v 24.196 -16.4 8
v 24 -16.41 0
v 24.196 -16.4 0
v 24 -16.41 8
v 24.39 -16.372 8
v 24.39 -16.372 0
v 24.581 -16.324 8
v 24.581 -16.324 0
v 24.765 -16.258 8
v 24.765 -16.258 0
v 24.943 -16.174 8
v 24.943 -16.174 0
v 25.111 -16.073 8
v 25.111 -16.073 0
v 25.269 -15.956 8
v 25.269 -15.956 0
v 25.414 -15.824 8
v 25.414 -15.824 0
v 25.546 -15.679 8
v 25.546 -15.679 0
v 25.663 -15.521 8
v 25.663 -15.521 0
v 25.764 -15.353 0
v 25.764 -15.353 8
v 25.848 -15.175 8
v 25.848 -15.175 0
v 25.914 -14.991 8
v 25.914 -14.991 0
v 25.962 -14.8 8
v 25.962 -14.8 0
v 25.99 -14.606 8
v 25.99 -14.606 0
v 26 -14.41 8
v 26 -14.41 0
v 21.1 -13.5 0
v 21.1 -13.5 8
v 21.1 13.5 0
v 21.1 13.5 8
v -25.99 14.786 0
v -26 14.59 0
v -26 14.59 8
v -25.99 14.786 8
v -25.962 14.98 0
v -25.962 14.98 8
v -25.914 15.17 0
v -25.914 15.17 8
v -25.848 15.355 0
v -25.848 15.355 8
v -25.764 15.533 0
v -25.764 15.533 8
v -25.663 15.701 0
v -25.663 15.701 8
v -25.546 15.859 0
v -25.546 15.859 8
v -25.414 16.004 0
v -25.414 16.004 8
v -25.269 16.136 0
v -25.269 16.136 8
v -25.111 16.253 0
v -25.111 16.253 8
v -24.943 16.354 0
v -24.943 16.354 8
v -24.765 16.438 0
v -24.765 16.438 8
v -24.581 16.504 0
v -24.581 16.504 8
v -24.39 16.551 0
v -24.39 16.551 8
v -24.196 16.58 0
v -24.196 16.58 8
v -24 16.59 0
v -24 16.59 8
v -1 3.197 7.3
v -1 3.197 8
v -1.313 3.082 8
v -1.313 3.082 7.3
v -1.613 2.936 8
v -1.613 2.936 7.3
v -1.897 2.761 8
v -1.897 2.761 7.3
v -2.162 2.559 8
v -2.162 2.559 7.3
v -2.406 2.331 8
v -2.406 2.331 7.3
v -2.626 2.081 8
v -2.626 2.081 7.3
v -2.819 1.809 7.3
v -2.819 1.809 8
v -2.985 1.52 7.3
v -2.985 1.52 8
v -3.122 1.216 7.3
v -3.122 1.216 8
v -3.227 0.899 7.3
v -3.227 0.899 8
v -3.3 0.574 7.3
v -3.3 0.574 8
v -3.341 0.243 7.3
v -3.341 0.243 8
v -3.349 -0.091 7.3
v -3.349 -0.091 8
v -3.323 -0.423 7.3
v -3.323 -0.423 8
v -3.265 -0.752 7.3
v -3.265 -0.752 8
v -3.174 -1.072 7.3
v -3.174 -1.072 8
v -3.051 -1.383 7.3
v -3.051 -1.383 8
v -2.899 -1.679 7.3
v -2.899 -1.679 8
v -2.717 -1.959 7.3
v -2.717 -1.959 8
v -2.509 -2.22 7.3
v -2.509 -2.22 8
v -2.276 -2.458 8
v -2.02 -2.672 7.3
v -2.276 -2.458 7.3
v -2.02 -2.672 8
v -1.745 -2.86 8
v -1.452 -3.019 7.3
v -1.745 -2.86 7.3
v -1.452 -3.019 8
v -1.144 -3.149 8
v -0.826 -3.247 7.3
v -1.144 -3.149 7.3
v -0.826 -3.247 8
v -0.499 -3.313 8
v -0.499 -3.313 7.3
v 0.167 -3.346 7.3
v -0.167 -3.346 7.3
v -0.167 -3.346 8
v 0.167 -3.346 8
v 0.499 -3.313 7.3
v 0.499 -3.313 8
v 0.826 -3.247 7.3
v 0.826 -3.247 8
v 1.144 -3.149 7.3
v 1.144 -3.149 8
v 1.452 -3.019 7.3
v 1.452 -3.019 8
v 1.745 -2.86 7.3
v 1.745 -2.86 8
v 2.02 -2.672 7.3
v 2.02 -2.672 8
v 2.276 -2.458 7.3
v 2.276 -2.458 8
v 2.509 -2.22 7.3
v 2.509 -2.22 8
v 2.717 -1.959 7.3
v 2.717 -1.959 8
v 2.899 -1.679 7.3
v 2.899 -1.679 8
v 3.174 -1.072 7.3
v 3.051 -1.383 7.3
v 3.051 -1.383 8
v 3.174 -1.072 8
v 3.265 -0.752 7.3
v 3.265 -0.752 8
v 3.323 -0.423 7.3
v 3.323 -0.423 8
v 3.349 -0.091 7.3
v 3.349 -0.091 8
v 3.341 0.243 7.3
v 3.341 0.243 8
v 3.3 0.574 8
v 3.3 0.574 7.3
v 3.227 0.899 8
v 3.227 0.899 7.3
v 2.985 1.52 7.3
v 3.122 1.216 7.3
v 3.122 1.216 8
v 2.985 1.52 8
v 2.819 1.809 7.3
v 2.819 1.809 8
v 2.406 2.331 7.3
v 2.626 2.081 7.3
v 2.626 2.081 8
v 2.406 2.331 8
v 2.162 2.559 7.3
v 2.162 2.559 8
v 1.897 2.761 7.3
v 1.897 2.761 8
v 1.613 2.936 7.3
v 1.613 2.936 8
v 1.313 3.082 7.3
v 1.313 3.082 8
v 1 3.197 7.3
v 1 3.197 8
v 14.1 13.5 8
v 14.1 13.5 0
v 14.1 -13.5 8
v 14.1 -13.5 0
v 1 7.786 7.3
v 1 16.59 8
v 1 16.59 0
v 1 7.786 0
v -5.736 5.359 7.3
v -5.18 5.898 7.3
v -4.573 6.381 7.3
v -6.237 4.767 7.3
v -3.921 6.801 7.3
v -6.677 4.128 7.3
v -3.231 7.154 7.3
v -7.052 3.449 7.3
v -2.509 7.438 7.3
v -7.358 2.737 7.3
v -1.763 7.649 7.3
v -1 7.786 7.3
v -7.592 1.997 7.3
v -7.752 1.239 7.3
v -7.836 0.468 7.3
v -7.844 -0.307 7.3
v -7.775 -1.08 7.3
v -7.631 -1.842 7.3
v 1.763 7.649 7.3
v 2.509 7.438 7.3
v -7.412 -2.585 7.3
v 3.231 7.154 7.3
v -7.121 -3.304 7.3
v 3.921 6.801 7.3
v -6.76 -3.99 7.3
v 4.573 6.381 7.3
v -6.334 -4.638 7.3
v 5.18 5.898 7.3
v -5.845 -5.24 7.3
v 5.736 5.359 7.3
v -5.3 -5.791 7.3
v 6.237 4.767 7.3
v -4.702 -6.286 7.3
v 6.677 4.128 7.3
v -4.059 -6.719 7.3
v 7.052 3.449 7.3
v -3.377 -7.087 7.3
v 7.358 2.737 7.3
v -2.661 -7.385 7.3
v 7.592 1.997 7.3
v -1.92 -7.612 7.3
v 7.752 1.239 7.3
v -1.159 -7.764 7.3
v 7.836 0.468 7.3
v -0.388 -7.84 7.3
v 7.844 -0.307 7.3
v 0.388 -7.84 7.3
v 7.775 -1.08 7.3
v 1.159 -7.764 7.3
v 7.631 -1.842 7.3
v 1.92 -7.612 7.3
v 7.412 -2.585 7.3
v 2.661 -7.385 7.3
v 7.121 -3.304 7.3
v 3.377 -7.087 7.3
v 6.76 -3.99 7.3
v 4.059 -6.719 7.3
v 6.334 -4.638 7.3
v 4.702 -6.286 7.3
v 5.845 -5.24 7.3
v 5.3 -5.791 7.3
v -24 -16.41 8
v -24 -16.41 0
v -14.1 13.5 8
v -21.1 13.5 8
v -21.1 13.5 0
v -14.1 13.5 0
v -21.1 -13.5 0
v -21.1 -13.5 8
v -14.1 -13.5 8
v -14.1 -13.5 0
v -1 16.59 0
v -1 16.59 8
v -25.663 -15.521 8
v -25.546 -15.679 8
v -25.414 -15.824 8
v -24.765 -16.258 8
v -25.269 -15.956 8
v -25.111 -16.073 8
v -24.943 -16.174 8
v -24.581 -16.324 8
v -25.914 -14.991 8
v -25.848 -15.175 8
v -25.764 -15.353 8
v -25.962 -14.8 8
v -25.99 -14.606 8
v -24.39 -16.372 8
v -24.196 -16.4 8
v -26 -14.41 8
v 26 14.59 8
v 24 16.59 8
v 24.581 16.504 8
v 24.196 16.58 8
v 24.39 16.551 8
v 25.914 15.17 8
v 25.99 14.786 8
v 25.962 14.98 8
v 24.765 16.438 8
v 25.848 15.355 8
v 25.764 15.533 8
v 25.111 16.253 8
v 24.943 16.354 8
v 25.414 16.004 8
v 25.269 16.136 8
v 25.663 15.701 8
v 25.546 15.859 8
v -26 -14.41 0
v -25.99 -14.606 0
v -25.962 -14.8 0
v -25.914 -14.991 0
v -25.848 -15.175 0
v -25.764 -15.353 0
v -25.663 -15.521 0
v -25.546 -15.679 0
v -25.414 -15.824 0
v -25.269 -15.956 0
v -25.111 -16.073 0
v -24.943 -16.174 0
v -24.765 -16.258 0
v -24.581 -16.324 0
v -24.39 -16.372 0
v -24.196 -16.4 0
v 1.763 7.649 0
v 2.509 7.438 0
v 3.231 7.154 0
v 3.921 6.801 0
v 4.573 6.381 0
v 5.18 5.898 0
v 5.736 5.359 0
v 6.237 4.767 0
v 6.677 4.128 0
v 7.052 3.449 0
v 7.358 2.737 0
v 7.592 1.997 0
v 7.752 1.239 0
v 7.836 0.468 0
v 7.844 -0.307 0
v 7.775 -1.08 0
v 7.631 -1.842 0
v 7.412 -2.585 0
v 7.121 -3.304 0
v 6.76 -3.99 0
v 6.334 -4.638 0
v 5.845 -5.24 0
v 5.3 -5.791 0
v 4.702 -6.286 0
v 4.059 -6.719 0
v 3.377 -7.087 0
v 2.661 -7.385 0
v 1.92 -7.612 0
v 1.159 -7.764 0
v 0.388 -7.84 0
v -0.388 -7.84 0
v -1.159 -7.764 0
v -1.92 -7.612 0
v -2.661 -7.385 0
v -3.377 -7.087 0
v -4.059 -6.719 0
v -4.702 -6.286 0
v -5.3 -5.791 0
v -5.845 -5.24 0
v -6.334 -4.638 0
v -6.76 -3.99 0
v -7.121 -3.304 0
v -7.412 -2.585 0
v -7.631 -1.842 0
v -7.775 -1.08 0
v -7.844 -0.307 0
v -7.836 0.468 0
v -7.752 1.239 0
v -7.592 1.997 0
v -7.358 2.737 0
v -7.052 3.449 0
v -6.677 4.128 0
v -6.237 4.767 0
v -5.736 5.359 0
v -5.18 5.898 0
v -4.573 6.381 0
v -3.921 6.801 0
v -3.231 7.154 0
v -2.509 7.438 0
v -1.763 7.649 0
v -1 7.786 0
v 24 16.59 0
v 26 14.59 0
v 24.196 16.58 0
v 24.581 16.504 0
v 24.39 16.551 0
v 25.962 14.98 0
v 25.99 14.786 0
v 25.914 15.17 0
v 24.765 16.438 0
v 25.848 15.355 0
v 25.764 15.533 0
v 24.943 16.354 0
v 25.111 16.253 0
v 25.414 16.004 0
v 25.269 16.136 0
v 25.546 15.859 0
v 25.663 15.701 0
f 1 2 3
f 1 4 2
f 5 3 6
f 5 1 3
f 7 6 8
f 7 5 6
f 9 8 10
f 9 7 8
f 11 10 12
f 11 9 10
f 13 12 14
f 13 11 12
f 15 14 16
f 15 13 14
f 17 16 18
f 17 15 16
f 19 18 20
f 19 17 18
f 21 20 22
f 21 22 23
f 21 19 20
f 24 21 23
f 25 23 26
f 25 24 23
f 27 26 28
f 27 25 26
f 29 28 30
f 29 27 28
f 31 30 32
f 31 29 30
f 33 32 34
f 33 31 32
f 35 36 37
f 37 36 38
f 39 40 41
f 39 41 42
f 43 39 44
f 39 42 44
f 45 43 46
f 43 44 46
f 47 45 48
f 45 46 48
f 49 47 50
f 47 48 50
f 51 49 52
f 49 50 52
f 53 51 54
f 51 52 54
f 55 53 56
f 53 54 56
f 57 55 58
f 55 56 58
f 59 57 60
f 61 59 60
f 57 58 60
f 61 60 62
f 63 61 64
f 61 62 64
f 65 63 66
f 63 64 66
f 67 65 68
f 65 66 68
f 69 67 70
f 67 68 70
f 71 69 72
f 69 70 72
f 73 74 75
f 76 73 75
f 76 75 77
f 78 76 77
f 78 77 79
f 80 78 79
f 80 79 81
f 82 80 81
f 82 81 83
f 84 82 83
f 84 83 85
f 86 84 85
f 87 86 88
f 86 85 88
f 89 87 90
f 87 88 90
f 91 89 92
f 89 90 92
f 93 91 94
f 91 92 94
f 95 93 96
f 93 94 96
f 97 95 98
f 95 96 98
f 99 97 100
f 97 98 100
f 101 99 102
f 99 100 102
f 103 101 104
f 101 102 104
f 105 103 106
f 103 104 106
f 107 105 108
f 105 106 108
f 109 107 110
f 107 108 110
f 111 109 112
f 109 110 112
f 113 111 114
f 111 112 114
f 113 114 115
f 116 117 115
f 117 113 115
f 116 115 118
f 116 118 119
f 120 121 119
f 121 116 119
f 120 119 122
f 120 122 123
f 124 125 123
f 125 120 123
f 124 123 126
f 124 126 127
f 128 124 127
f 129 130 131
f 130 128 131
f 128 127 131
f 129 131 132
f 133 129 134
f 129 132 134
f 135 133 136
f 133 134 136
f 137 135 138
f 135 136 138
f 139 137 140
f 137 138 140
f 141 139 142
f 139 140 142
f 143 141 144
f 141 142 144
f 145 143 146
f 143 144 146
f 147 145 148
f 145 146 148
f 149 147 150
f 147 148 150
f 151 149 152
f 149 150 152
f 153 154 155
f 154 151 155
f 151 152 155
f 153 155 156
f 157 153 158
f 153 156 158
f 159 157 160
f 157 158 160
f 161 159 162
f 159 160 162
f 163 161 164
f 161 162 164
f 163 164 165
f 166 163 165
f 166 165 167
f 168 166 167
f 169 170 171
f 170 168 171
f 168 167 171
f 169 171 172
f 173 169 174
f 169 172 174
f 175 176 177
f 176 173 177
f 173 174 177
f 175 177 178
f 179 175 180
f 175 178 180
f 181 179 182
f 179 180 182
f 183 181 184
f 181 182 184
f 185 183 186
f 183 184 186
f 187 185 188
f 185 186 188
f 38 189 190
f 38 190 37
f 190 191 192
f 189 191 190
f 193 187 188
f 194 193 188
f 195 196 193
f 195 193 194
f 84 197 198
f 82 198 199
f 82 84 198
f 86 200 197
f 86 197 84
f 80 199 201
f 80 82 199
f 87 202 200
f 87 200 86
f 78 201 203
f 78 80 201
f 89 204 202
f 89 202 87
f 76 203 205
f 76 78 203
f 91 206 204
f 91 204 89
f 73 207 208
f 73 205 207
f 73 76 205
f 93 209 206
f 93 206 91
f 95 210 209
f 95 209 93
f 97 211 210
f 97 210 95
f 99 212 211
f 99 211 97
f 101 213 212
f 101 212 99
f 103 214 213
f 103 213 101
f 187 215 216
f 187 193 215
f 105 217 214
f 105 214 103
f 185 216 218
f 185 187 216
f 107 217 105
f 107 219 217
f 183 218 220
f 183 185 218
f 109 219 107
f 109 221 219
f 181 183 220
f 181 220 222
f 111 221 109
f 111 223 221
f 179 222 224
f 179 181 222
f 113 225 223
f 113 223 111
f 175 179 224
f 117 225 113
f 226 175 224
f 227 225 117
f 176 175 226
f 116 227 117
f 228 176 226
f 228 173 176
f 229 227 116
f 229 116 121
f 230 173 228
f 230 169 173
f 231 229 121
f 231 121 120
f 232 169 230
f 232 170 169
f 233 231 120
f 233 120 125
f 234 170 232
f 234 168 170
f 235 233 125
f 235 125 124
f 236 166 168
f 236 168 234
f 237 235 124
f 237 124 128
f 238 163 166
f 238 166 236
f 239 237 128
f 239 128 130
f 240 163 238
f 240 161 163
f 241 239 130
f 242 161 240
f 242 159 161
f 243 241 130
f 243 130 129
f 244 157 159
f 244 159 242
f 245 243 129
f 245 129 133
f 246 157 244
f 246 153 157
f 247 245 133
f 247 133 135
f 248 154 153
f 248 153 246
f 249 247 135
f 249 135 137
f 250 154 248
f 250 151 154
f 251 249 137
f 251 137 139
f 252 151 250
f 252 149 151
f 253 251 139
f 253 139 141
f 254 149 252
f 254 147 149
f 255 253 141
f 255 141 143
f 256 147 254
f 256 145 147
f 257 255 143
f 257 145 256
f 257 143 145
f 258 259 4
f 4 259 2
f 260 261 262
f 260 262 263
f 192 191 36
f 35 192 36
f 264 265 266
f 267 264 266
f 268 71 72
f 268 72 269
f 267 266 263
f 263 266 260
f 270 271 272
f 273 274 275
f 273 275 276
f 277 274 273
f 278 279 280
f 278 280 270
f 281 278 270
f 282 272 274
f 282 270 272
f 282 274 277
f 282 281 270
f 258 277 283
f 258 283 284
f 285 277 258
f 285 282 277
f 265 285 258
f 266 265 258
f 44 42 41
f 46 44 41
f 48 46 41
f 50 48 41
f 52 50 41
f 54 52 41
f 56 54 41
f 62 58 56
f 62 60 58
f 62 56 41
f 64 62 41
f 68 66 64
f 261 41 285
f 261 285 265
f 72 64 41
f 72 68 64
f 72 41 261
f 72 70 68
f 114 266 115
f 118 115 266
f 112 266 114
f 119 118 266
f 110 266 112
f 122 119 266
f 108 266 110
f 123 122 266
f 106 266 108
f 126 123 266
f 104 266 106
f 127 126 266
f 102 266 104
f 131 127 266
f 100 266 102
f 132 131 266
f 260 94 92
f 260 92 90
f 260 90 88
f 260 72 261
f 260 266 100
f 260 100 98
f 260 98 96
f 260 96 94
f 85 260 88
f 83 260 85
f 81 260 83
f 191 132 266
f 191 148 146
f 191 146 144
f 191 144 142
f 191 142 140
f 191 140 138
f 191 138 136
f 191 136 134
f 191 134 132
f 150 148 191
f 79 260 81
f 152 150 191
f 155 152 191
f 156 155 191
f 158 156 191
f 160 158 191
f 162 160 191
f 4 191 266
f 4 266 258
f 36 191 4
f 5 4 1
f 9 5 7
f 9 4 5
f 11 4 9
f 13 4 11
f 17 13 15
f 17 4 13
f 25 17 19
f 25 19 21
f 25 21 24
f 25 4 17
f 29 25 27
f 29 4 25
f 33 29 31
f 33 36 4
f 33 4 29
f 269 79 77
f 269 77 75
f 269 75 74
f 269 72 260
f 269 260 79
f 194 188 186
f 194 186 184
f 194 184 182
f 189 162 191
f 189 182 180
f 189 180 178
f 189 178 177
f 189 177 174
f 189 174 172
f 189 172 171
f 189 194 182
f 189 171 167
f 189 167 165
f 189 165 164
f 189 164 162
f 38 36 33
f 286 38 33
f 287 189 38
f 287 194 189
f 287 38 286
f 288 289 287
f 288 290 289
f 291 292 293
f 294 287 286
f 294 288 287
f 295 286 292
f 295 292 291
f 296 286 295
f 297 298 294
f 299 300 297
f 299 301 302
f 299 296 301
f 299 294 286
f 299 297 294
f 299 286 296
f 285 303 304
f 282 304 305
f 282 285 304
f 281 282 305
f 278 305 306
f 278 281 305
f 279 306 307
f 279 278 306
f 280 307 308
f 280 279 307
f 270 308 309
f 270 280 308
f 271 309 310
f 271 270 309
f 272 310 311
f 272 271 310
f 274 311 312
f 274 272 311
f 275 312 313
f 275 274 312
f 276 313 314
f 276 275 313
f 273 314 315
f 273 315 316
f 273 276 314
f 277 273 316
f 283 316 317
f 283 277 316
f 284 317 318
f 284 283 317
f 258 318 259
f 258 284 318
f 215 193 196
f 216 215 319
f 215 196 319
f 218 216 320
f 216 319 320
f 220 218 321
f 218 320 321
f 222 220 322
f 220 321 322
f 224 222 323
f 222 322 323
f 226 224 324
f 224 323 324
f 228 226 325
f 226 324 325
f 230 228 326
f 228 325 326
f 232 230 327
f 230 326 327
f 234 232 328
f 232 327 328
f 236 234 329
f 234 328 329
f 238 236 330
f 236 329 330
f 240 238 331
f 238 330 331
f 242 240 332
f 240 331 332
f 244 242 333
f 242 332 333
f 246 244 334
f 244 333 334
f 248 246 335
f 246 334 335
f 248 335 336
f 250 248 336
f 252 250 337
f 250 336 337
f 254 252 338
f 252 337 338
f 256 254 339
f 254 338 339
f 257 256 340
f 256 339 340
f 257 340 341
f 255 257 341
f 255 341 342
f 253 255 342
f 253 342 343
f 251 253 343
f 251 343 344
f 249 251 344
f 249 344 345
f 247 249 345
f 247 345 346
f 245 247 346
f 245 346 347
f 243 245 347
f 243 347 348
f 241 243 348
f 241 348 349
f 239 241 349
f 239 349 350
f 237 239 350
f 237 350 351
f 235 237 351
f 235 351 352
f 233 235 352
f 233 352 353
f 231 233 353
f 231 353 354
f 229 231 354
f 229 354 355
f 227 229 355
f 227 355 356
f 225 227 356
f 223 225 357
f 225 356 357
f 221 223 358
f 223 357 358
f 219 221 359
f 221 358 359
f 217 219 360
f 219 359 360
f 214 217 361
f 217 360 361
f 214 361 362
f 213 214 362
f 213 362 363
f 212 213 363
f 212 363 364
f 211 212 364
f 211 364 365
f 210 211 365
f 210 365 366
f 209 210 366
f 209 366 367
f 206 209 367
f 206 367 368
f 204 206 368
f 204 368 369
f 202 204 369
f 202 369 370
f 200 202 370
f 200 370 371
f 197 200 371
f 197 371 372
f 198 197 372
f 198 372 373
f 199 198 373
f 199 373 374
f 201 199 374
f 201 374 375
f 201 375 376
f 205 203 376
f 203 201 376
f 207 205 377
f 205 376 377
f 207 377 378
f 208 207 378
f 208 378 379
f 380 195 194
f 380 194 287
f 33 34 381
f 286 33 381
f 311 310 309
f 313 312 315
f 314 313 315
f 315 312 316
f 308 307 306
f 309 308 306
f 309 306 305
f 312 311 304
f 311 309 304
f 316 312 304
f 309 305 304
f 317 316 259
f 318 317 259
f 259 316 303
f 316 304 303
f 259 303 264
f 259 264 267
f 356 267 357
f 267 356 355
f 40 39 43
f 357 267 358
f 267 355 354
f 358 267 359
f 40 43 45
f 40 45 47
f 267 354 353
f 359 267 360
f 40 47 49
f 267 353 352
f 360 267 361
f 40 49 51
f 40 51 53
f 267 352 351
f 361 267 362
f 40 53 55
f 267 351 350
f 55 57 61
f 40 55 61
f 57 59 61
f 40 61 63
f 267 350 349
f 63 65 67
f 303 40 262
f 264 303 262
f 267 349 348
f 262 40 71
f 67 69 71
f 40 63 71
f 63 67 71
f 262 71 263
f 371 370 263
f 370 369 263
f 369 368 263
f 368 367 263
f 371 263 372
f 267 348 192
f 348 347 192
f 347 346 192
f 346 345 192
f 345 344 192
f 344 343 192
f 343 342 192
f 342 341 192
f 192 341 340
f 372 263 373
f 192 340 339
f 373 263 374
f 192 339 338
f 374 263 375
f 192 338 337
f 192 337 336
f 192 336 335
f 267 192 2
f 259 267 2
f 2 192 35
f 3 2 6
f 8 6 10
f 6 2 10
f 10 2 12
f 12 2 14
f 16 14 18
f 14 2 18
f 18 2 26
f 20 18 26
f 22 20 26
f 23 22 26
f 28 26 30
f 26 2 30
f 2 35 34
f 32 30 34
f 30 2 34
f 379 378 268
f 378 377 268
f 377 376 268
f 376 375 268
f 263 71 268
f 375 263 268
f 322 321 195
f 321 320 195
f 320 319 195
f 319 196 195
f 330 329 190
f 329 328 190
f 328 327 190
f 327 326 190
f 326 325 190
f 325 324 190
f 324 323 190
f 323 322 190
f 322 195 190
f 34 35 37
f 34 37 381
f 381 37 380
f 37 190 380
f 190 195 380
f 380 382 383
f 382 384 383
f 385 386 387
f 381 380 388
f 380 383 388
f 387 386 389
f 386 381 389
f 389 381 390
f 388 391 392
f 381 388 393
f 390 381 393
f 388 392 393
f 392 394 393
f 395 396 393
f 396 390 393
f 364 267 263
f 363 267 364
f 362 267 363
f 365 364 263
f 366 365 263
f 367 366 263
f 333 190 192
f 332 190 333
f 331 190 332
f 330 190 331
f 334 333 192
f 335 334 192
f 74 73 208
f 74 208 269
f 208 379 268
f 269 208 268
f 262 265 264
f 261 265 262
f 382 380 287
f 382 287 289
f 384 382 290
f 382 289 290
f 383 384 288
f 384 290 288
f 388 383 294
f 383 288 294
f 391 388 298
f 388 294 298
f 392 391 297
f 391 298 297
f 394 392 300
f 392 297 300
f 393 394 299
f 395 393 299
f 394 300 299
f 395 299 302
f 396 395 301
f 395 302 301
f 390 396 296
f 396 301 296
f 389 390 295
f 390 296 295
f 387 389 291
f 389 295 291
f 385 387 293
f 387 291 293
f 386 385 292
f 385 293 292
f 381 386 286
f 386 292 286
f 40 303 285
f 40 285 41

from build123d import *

# Parameters (mm, degrees)
F0_W      = 52
F0_H      = 33
F1_DEPTH  = 8
F2_R      = 7.85
F3_DEPTH  = 7.3
F4_R      = 3.35
F5_DEPTH  = 10
F6_R      = 2
F7_W      = 2
F7_H      = 22.600369
F8_DEPTH  = 18
F9_W      = 7
F9_H      = 27
F10_DEPTH = 8.001


with BuildPart() as f1:
    # F0 (on Top) → F1 (new body)
    with BuildSketch(Plane.XY):
        with Locations((0, 0.089891)):
            Rectangle(F0_W, F0_H)
    extrude(amount=F1_DEPTH)

    # F2 (on face) → F3 (cut)
    with BuildSketch(Plane(origin=(0, 0, 0), x_dir=(1, 0, 0), z_dir=(0, 0, -1))):
        Circle(F2_R)
    extrude(amount=-F3_DEPTH, mode=Mode.SUBTRACT)

    # F4 (on face) → F5 (cut)
    with BuildSketch(Plane.XY.offset(8)):
        Circle(F4_R)
    extrude(amount=-F5_DEPTH, mode=Mode.SUBTRACT)

    # F6
    f6_edges = [f1.edges().sort_by_distance(p)[0] for p in [
        (26, -16.410109, 4),
        (26, 16.589891, 4),
        (-26, 16.589891, 4),
        (-26, -16.410109, 4),
    ]]
    fillet(f6_edges, radius=F6_R)

    # F7 (on Top) → F8 (cut)
    with BuildSketch(Plane.XY):
        with Locations((0, 11.300185)):
            Rectangle(F7_W, F7_H)
    extrude(amount=F8_DEPTH, mode=Mode.SUBTRACT)

    # F9 (on face) → F10 (cut, through all)
    with BuildSketch(Plane.XY.offset(8)):
        with Locations((-17.6, 0)):
            Rectangle(F9_W, F9_H)
        with Locations((17.6, 0)):
            Rectangle(F9_W, F9_H)
    extrude(amount=-F10_DEPTH, mode=Mode.SUBTRACT)


solid = f1.part
